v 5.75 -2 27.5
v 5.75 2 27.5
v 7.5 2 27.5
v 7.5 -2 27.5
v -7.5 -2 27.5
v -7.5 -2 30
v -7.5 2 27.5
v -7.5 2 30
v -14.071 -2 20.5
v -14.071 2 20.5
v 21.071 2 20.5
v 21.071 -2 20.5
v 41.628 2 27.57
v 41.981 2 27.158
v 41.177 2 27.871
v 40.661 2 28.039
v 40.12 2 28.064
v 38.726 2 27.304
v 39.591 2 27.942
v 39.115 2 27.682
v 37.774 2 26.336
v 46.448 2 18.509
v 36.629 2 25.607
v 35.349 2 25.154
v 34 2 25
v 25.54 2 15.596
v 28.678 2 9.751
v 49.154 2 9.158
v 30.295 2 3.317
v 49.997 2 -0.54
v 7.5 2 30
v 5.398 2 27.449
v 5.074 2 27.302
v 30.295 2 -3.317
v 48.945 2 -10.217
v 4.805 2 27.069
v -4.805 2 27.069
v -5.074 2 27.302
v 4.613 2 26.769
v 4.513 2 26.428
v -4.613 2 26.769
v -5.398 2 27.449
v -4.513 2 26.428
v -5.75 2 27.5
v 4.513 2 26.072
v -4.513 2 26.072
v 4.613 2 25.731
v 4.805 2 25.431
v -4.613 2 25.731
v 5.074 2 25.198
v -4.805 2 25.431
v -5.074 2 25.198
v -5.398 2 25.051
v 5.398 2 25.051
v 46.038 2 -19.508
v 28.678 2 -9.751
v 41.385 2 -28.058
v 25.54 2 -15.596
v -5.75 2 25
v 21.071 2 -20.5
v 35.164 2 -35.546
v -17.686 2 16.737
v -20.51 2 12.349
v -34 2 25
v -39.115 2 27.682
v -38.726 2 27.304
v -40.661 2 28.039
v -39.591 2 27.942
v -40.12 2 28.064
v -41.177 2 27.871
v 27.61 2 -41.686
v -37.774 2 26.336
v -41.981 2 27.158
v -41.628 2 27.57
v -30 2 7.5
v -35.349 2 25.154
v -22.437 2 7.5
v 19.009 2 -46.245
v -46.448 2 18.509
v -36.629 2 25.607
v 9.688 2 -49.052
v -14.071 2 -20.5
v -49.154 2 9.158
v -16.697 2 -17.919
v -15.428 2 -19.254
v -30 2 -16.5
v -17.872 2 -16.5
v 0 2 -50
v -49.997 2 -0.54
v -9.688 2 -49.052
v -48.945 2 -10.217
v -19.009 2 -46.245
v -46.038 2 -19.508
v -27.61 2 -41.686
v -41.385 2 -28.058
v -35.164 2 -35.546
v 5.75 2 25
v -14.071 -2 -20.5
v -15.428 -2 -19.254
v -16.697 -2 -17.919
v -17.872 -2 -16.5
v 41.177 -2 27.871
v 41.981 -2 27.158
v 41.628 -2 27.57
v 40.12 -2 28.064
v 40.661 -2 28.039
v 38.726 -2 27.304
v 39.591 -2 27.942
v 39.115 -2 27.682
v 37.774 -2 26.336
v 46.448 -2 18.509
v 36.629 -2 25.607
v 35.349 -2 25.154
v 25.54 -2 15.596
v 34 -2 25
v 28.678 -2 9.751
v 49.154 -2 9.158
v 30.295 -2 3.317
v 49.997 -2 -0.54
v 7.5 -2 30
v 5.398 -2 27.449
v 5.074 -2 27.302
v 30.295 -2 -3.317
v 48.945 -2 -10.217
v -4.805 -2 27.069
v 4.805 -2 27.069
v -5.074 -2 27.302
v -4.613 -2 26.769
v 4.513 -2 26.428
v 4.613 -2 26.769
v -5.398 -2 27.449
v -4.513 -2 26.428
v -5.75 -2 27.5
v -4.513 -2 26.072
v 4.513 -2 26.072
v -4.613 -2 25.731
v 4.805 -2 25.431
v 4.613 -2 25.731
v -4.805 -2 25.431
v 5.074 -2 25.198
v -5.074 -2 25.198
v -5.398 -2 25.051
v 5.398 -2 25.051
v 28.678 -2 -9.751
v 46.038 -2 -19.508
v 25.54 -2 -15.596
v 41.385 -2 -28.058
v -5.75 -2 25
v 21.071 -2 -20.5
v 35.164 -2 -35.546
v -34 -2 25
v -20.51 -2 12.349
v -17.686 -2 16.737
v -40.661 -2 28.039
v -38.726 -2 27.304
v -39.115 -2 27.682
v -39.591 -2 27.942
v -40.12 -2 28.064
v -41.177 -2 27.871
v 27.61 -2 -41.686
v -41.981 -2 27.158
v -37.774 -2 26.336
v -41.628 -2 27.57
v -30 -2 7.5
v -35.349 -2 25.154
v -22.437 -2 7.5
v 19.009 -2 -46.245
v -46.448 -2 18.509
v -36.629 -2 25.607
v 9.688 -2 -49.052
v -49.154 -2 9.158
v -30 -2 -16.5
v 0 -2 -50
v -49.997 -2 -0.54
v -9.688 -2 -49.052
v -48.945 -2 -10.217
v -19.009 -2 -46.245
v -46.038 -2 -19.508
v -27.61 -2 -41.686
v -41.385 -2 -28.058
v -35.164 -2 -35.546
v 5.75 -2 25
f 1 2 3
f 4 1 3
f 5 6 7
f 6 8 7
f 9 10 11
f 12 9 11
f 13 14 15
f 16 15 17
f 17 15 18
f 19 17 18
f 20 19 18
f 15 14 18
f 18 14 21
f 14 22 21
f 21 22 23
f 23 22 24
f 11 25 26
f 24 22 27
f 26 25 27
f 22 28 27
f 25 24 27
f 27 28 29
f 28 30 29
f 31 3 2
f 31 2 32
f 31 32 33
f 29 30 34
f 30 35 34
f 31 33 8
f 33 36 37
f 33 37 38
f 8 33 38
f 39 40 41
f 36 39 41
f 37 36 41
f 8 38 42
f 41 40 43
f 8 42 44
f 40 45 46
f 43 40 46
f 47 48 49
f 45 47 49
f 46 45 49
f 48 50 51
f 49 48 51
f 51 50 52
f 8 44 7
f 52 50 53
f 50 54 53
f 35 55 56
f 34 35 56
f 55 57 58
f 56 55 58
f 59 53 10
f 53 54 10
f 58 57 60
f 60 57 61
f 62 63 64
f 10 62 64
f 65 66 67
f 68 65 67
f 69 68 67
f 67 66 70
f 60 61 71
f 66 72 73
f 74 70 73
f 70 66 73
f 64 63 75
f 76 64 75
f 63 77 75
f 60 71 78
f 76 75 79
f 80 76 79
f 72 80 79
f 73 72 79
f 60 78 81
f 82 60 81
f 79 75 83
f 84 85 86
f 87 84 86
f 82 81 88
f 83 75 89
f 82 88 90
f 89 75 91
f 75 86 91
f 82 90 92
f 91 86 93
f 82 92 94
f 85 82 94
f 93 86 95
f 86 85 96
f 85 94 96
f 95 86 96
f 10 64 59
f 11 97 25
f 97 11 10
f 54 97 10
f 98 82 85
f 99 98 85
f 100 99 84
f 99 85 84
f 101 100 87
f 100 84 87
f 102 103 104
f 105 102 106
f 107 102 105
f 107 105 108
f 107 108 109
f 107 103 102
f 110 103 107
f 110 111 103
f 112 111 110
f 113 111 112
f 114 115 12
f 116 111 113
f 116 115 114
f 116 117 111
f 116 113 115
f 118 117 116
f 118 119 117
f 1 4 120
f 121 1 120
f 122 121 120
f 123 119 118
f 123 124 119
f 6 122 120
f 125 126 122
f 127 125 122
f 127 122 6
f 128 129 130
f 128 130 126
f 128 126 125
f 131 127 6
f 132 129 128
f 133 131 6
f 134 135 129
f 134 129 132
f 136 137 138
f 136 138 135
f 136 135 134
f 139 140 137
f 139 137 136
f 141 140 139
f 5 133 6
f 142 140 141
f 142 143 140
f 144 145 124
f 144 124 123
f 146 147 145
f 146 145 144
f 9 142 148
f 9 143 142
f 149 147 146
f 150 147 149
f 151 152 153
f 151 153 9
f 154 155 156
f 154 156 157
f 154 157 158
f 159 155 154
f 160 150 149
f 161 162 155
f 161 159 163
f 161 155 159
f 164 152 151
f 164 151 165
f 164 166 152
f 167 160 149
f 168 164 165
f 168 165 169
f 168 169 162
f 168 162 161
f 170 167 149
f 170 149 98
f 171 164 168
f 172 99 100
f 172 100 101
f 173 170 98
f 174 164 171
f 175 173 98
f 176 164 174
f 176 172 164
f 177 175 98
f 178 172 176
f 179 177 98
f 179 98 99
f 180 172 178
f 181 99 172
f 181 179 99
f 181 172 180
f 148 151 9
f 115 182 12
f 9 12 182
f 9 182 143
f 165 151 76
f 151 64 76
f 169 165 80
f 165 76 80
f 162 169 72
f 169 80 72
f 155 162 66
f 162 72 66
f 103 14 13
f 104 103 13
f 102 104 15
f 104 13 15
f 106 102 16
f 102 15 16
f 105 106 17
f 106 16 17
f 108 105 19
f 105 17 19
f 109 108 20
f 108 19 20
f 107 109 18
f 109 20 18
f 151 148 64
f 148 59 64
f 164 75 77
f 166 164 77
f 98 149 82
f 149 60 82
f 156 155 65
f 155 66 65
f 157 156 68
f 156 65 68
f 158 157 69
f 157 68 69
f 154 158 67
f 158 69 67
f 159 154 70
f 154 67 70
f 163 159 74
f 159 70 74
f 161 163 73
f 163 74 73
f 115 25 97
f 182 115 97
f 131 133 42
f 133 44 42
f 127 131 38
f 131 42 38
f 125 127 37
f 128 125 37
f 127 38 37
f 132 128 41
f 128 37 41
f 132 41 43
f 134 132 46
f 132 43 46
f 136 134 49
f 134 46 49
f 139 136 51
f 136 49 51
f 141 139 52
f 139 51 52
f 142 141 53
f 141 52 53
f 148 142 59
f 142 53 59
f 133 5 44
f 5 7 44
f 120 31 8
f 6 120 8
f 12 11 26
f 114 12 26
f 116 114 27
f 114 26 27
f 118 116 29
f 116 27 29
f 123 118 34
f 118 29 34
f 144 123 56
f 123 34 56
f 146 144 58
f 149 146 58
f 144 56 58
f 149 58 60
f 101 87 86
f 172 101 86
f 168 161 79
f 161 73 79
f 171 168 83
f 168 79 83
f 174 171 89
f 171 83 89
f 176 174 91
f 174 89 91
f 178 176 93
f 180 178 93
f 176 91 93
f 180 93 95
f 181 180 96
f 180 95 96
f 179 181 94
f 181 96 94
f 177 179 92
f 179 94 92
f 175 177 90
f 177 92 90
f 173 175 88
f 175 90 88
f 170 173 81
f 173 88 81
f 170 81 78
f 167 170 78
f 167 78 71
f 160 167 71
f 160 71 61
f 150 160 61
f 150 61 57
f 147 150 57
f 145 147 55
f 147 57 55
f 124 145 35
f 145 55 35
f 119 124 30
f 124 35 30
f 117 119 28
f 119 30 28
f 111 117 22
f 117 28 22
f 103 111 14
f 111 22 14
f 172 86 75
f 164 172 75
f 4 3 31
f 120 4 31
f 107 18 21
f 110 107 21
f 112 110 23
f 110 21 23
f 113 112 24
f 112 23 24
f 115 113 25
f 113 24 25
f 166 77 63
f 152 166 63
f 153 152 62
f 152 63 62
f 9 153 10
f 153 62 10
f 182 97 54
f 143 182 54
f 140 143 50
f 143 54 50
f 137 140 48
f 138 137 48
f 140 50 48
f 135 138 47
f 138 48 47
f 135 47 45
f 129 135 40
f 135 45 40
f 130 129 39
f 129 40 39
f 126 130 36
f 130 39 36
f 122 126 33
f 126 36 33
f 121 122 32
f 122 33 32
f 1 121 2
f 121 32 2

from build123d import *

# Parameters (mm, degrees)
BOSS_EXTRUDE1_DEPTH = 2


with BuildPart() as part:
    # Sketch1 → Boss-Extrude1 (new, symmetric)
    with BuildSketch(Plane(origin=(0, 0, 0), x_dir=(1, 0, 0), z_dir=(0, 1, 0))):
        with BuildLine():
            Line((7.5, -30), (-7.5, -30))
            Line((-7.5, -30), (-7.5, -27.5))
            Line((-7.5, -27.5), (-5.75, -27.5))
            ThreePointArc((-5.75, -27.5), (-4.5, -26.25), (-5.75, -25))
            Line((-5.75, -25), (-34, -25))
            ThreePointArc((-34, -25), (-36.629076053, -25.606674578), (-38.726487571, -27.304013631))
            ThreePointArc((-38.726487571, -27.304013631), (-40.391401006, -28.070018299), (-41.981232738, -27.158352266))
            ThreePointArc((-41.981232738, -27.158352266), (0, 50), (41.981232738, -27.158352266))
            ThreePointArc((41.981232738, -27.158352266), (40.391401006, -28.070018299), (38.726487571, -27.304013631))
            ThreePointArc((38.726487571, -27.304013631), (36.629076053, -25.606674578), (34, -25))
            Line((34, -25), (5.75, -25))
            ThreePointArc((5.75, -25), (4.5, -26.25), (5.75, -27.5))
            Line((5.75, -27.5), (7.5, -27.5))
            Line((7.5, -27.5), (7.5, -30))
        make_face()
        with BuildLine():
            Line((21.071283391, 20.5), (-14.071283391, 20.5))
            ThreePointArc((-14.071283391, 20.5), (-16.073941577, 18.597333441), (-17.871710273, 16.5))
            Line((-17.871710273, 16.5), (-30, 16.5))
            Line((-30, 16.5), (-30, -7.5))
            Line((-30, -7.5), (-22.437424699, -7.5))
            ThreePointArc((-22.437424699, -7.5), (-19.204667359, -14.611573498), (-14.071283391, -20.5))
            Line((-14.071283391, -20.5), (21.071283391, -20.5))
            ThreePointArc((21.071283391, -20.5), (30.5, 0), (21.071283391, 20.5))
        make_face(mode=Mode.SUBTRACT)
    extrude(amount=BOSS_EXTRUDE1_DEPTH, both=True)


solid = part.part
